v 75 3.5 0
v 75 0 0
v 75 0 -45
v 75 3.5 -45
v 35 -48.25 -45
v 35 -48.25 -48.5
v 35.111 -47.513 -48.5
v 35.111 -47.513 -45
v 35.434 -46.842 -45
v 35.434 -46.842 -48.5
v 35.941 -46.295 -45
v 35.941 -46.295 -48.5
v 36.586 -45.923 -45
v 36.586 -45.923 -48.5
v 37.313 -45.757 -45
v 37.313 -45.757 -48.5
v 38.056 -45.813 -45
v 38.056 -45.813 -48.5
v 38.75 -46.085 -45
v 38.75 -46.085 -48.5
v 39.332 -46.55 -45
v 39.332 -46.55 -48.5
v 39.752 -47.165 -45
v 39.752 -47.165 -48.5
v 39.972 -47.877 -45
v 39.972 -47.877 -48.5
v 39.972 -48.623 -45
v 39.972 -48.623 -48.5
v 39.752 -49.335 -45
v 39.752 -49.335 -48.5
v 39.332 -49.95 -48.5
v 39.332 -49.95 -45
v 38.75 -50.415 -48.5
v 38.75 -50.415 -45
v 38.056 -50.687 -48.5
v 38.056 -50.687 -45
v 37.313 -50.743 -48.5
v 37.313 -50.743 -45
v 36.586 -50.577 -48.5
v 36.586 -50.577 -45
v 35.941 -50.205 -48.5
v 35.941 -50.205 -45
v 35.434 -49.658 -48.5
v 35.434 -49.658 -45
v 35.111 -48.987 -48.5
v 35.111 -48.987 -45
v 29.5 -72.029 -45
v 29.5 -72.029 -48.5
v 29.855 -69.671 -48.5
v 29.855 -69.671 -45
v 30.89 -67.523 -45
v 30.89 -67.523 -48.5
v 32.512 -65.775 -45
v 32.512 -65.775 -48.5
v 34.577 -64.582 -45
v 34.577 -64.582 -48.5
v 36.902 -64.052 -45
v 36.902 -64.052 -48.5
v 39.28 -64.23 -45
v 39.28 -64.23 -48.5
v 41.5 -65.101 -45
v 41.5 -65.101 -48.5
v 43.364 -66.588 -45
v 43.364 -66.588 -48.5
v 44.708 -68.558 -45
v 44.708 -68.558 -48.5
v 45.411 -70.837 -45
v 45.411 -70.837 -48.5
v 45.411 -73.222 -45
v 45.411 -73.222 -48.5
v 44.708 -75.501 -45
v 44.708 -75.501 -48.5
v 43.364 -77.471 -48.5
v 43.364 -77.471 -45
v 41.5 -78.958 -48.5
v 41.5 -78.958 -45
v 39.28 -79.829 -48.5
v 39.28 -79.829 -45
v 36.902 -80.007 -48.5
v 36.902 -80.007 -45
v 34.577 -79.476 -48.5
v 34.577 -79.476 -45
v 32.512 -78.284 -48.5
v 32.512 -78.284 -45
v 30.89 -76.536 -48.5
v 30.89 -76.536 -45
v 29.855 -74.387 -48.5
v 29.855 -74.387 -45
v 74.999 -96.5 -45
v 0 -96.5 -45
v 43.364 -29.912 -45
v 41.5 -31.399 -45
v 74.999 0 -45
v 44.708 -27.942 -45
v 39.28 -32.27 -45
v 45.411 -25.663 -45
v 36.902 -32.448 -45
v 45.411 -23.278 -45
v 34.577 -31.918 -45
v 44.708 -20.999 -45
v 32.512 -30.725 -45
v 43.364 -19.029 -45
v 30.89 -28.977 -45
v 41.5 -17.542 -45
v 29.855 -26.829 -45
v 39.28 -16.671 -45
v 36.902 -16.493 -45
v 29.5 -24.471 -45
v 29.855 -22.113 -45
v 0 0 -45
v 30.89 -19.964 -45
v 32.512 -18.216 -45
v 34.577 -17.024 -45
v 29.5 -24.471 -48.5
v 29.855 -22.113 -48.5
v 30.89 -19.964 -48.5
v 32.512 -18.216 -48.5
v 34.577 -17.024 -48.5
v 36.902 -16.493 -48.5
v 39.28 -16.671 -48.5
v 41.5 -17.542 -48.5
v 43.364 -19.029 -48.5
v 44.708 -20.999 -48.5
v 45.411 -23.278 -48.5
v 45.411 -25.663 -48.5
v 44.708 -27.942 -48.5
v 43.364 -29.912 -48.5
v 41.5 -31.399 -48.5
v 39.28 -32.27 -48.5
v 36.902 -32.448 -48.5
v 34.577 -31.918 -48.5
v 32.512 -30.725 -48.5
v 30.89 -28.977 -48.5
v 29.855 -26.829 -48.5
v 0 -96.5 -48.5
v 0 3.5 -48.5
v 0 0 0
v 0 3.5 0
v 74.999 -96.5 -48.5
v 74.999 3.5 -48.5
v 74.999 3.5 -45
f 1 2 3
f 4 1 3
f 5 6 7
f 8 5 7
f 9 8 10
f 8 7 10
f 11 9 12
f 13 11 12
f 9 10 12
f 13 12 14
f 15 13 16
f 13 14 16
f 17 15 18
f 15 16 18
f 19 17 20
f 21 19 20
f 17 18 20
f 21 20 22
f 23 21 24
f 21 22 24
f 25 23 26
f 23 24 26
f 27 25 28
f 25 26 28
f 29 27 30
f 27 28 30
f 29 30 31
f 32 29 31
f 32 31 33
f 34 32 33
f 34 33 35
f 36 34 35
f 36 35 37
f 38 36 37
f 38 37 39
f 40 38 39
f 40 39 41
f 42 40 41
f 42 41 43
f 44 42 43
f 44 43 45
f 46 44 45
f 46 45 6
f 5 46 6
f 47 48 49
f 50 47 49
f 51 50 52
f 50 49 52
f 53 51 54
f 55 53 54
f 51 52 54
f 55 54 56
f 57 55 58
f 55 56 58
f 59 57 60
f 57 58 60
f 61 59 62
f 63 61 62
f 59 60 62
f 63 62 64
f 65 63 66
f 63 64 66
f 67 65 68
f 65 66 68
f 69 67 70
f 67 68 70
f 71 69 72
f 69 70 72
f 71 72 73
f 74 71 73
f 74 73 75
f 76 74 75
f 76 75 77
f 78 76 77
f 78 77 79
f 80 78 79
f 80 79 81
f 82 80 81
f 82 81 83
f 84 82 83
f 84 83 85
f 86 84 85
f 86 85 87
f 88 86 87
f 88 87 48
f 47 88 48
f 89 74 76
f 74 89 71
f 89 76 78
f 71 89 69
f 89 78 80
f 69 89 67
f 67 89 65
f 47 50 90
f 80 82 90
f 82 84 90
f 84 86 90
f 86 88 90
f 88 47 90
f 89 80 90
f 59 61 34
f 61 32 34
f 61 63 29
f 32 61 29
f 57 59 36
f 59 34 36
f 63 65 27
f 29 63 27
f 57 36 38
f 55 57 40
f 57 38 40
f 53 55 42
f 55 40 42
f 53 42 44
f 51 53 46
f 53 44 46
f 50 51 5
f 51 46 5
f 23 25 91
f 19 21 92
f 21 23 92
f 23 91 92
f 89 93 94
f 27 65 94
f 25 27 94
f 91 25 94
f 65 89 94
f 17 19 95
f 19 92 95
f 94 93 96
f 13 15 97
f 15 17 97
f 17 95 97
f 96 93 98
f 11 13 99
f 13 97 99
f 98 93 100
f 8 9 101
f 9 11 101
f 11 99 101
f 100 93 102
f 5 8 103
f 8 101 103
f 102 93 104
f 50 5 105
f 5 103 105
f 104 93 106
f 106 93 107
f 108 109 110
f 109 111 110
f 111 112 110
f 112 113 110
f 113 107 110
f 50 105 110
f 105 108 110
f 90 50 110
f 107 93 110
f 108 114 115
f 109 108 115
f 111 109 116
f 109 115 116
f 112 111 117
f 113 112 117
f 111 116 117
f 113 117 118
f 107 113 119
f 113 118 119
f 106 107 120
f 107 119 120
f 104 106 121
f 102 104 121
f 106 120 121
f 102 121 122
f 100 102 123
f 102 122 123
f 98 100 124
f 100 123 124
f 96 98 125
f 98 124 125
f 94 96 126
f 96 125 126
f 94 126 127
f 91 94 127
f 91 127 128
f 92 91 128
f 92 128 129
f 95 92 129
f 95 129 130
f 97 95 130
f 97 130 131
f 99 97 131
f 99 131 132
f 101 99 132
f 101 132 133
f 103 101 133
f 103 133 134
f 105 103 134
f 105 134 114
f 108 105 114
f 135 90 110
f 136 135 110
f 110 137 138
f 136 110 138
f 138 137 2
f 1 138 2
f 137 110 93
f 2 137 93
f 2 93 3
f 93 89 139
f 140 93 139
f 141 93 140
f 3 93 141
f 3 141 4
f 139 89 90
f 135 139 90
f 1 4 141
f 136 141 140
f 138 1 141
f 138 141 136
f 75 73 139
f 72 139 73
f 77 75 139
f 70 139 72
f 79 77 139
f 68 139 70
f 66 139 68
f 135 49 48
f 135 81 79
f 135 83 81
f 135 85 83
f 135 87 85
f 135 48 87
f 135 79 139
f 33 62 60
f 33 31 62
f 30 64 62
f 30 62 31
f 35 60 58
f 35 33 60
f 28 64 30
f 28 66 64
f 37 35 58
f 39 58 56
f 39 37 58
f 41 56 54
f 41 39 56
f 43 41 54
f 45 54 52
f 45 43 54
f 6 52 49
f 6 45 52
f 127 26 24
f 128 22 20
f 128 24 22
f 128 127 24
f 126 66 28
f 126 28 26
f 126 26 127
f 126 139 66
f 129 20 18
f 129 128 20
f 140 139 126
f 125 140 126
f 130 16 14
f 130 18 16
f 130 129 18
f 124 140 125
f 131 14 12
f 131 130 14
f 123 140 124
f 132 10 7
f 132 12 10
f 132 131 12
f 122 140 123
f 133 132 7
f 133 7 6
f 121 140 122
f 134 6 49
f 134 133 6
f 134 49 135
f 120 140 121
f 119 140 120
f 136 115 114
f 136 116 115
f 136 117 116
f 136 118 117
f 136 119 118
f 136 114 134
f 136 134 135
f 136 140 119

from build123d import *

# Parameters (mm, degrees)
SKETCH1_W           = 75
SKETCH1_H           = 45
BOSS_EXTRUDE1_DEPTH = 3.5
SKETCH2_W           = 74.999337444
SKETCH2_H           = 100
BOSS_EXTRUDE2_DEPTH = 3.5
SKETCH3_R           = 8
SKETCH3_R_2         = 2.5
CUT_EXTRUDE2_DEPTH  = 132.48954331


with BuildPart() as part:
    # Sketch1 → Boss-Extrude1 (new body)
    with BuildSketch(Plane(origin=(0, 0, 0), x_dir=(1, 0, 0), z_dir=(0, 1, 0))):
        with Locations((37.5, 22.5)):
            Rectangle(SKETCH1_W, SKETCH1_H)
    extrude(amount=BOSS_EXTRUDE1_DEPTH)

    # Sketch2 → Boss-Extrude2 (add)
    with BuildSketch(Plane(origin=(0, 0, -45), x_dir=(-1, 0, 0), z_dir=(0, 0, -1))):
        with Locations((-37.499668722, -46.5)):
            Rectangle(SKETCH2_W, SKETCH2_H)
    extrude(amount=BOSS_EXTRUDE2_DEPTH)

    # Sketch3 → Cut-Extrude2 (cut, through all)
    with BuildSketch(Plane(origin=(0, 0, -48.5), x_dir=(-1, 0, 0), z_dir=(0, 0, -1))):
        with Locations((-37.49990734, -24.47055223)):
            Circle(SKETCH3_R)
        with Locations((-37.49990734, -72.02944777)):
            Circle(SKETCH3_R)
        with Locations((-37.499668722, -48.25)):
            Circle(SKETCH3_R_2)
    extrude(amount=-CUT_EXTRUDE2_DEPTH, mode=Mode.SUBTRACT)


solid = part.part
